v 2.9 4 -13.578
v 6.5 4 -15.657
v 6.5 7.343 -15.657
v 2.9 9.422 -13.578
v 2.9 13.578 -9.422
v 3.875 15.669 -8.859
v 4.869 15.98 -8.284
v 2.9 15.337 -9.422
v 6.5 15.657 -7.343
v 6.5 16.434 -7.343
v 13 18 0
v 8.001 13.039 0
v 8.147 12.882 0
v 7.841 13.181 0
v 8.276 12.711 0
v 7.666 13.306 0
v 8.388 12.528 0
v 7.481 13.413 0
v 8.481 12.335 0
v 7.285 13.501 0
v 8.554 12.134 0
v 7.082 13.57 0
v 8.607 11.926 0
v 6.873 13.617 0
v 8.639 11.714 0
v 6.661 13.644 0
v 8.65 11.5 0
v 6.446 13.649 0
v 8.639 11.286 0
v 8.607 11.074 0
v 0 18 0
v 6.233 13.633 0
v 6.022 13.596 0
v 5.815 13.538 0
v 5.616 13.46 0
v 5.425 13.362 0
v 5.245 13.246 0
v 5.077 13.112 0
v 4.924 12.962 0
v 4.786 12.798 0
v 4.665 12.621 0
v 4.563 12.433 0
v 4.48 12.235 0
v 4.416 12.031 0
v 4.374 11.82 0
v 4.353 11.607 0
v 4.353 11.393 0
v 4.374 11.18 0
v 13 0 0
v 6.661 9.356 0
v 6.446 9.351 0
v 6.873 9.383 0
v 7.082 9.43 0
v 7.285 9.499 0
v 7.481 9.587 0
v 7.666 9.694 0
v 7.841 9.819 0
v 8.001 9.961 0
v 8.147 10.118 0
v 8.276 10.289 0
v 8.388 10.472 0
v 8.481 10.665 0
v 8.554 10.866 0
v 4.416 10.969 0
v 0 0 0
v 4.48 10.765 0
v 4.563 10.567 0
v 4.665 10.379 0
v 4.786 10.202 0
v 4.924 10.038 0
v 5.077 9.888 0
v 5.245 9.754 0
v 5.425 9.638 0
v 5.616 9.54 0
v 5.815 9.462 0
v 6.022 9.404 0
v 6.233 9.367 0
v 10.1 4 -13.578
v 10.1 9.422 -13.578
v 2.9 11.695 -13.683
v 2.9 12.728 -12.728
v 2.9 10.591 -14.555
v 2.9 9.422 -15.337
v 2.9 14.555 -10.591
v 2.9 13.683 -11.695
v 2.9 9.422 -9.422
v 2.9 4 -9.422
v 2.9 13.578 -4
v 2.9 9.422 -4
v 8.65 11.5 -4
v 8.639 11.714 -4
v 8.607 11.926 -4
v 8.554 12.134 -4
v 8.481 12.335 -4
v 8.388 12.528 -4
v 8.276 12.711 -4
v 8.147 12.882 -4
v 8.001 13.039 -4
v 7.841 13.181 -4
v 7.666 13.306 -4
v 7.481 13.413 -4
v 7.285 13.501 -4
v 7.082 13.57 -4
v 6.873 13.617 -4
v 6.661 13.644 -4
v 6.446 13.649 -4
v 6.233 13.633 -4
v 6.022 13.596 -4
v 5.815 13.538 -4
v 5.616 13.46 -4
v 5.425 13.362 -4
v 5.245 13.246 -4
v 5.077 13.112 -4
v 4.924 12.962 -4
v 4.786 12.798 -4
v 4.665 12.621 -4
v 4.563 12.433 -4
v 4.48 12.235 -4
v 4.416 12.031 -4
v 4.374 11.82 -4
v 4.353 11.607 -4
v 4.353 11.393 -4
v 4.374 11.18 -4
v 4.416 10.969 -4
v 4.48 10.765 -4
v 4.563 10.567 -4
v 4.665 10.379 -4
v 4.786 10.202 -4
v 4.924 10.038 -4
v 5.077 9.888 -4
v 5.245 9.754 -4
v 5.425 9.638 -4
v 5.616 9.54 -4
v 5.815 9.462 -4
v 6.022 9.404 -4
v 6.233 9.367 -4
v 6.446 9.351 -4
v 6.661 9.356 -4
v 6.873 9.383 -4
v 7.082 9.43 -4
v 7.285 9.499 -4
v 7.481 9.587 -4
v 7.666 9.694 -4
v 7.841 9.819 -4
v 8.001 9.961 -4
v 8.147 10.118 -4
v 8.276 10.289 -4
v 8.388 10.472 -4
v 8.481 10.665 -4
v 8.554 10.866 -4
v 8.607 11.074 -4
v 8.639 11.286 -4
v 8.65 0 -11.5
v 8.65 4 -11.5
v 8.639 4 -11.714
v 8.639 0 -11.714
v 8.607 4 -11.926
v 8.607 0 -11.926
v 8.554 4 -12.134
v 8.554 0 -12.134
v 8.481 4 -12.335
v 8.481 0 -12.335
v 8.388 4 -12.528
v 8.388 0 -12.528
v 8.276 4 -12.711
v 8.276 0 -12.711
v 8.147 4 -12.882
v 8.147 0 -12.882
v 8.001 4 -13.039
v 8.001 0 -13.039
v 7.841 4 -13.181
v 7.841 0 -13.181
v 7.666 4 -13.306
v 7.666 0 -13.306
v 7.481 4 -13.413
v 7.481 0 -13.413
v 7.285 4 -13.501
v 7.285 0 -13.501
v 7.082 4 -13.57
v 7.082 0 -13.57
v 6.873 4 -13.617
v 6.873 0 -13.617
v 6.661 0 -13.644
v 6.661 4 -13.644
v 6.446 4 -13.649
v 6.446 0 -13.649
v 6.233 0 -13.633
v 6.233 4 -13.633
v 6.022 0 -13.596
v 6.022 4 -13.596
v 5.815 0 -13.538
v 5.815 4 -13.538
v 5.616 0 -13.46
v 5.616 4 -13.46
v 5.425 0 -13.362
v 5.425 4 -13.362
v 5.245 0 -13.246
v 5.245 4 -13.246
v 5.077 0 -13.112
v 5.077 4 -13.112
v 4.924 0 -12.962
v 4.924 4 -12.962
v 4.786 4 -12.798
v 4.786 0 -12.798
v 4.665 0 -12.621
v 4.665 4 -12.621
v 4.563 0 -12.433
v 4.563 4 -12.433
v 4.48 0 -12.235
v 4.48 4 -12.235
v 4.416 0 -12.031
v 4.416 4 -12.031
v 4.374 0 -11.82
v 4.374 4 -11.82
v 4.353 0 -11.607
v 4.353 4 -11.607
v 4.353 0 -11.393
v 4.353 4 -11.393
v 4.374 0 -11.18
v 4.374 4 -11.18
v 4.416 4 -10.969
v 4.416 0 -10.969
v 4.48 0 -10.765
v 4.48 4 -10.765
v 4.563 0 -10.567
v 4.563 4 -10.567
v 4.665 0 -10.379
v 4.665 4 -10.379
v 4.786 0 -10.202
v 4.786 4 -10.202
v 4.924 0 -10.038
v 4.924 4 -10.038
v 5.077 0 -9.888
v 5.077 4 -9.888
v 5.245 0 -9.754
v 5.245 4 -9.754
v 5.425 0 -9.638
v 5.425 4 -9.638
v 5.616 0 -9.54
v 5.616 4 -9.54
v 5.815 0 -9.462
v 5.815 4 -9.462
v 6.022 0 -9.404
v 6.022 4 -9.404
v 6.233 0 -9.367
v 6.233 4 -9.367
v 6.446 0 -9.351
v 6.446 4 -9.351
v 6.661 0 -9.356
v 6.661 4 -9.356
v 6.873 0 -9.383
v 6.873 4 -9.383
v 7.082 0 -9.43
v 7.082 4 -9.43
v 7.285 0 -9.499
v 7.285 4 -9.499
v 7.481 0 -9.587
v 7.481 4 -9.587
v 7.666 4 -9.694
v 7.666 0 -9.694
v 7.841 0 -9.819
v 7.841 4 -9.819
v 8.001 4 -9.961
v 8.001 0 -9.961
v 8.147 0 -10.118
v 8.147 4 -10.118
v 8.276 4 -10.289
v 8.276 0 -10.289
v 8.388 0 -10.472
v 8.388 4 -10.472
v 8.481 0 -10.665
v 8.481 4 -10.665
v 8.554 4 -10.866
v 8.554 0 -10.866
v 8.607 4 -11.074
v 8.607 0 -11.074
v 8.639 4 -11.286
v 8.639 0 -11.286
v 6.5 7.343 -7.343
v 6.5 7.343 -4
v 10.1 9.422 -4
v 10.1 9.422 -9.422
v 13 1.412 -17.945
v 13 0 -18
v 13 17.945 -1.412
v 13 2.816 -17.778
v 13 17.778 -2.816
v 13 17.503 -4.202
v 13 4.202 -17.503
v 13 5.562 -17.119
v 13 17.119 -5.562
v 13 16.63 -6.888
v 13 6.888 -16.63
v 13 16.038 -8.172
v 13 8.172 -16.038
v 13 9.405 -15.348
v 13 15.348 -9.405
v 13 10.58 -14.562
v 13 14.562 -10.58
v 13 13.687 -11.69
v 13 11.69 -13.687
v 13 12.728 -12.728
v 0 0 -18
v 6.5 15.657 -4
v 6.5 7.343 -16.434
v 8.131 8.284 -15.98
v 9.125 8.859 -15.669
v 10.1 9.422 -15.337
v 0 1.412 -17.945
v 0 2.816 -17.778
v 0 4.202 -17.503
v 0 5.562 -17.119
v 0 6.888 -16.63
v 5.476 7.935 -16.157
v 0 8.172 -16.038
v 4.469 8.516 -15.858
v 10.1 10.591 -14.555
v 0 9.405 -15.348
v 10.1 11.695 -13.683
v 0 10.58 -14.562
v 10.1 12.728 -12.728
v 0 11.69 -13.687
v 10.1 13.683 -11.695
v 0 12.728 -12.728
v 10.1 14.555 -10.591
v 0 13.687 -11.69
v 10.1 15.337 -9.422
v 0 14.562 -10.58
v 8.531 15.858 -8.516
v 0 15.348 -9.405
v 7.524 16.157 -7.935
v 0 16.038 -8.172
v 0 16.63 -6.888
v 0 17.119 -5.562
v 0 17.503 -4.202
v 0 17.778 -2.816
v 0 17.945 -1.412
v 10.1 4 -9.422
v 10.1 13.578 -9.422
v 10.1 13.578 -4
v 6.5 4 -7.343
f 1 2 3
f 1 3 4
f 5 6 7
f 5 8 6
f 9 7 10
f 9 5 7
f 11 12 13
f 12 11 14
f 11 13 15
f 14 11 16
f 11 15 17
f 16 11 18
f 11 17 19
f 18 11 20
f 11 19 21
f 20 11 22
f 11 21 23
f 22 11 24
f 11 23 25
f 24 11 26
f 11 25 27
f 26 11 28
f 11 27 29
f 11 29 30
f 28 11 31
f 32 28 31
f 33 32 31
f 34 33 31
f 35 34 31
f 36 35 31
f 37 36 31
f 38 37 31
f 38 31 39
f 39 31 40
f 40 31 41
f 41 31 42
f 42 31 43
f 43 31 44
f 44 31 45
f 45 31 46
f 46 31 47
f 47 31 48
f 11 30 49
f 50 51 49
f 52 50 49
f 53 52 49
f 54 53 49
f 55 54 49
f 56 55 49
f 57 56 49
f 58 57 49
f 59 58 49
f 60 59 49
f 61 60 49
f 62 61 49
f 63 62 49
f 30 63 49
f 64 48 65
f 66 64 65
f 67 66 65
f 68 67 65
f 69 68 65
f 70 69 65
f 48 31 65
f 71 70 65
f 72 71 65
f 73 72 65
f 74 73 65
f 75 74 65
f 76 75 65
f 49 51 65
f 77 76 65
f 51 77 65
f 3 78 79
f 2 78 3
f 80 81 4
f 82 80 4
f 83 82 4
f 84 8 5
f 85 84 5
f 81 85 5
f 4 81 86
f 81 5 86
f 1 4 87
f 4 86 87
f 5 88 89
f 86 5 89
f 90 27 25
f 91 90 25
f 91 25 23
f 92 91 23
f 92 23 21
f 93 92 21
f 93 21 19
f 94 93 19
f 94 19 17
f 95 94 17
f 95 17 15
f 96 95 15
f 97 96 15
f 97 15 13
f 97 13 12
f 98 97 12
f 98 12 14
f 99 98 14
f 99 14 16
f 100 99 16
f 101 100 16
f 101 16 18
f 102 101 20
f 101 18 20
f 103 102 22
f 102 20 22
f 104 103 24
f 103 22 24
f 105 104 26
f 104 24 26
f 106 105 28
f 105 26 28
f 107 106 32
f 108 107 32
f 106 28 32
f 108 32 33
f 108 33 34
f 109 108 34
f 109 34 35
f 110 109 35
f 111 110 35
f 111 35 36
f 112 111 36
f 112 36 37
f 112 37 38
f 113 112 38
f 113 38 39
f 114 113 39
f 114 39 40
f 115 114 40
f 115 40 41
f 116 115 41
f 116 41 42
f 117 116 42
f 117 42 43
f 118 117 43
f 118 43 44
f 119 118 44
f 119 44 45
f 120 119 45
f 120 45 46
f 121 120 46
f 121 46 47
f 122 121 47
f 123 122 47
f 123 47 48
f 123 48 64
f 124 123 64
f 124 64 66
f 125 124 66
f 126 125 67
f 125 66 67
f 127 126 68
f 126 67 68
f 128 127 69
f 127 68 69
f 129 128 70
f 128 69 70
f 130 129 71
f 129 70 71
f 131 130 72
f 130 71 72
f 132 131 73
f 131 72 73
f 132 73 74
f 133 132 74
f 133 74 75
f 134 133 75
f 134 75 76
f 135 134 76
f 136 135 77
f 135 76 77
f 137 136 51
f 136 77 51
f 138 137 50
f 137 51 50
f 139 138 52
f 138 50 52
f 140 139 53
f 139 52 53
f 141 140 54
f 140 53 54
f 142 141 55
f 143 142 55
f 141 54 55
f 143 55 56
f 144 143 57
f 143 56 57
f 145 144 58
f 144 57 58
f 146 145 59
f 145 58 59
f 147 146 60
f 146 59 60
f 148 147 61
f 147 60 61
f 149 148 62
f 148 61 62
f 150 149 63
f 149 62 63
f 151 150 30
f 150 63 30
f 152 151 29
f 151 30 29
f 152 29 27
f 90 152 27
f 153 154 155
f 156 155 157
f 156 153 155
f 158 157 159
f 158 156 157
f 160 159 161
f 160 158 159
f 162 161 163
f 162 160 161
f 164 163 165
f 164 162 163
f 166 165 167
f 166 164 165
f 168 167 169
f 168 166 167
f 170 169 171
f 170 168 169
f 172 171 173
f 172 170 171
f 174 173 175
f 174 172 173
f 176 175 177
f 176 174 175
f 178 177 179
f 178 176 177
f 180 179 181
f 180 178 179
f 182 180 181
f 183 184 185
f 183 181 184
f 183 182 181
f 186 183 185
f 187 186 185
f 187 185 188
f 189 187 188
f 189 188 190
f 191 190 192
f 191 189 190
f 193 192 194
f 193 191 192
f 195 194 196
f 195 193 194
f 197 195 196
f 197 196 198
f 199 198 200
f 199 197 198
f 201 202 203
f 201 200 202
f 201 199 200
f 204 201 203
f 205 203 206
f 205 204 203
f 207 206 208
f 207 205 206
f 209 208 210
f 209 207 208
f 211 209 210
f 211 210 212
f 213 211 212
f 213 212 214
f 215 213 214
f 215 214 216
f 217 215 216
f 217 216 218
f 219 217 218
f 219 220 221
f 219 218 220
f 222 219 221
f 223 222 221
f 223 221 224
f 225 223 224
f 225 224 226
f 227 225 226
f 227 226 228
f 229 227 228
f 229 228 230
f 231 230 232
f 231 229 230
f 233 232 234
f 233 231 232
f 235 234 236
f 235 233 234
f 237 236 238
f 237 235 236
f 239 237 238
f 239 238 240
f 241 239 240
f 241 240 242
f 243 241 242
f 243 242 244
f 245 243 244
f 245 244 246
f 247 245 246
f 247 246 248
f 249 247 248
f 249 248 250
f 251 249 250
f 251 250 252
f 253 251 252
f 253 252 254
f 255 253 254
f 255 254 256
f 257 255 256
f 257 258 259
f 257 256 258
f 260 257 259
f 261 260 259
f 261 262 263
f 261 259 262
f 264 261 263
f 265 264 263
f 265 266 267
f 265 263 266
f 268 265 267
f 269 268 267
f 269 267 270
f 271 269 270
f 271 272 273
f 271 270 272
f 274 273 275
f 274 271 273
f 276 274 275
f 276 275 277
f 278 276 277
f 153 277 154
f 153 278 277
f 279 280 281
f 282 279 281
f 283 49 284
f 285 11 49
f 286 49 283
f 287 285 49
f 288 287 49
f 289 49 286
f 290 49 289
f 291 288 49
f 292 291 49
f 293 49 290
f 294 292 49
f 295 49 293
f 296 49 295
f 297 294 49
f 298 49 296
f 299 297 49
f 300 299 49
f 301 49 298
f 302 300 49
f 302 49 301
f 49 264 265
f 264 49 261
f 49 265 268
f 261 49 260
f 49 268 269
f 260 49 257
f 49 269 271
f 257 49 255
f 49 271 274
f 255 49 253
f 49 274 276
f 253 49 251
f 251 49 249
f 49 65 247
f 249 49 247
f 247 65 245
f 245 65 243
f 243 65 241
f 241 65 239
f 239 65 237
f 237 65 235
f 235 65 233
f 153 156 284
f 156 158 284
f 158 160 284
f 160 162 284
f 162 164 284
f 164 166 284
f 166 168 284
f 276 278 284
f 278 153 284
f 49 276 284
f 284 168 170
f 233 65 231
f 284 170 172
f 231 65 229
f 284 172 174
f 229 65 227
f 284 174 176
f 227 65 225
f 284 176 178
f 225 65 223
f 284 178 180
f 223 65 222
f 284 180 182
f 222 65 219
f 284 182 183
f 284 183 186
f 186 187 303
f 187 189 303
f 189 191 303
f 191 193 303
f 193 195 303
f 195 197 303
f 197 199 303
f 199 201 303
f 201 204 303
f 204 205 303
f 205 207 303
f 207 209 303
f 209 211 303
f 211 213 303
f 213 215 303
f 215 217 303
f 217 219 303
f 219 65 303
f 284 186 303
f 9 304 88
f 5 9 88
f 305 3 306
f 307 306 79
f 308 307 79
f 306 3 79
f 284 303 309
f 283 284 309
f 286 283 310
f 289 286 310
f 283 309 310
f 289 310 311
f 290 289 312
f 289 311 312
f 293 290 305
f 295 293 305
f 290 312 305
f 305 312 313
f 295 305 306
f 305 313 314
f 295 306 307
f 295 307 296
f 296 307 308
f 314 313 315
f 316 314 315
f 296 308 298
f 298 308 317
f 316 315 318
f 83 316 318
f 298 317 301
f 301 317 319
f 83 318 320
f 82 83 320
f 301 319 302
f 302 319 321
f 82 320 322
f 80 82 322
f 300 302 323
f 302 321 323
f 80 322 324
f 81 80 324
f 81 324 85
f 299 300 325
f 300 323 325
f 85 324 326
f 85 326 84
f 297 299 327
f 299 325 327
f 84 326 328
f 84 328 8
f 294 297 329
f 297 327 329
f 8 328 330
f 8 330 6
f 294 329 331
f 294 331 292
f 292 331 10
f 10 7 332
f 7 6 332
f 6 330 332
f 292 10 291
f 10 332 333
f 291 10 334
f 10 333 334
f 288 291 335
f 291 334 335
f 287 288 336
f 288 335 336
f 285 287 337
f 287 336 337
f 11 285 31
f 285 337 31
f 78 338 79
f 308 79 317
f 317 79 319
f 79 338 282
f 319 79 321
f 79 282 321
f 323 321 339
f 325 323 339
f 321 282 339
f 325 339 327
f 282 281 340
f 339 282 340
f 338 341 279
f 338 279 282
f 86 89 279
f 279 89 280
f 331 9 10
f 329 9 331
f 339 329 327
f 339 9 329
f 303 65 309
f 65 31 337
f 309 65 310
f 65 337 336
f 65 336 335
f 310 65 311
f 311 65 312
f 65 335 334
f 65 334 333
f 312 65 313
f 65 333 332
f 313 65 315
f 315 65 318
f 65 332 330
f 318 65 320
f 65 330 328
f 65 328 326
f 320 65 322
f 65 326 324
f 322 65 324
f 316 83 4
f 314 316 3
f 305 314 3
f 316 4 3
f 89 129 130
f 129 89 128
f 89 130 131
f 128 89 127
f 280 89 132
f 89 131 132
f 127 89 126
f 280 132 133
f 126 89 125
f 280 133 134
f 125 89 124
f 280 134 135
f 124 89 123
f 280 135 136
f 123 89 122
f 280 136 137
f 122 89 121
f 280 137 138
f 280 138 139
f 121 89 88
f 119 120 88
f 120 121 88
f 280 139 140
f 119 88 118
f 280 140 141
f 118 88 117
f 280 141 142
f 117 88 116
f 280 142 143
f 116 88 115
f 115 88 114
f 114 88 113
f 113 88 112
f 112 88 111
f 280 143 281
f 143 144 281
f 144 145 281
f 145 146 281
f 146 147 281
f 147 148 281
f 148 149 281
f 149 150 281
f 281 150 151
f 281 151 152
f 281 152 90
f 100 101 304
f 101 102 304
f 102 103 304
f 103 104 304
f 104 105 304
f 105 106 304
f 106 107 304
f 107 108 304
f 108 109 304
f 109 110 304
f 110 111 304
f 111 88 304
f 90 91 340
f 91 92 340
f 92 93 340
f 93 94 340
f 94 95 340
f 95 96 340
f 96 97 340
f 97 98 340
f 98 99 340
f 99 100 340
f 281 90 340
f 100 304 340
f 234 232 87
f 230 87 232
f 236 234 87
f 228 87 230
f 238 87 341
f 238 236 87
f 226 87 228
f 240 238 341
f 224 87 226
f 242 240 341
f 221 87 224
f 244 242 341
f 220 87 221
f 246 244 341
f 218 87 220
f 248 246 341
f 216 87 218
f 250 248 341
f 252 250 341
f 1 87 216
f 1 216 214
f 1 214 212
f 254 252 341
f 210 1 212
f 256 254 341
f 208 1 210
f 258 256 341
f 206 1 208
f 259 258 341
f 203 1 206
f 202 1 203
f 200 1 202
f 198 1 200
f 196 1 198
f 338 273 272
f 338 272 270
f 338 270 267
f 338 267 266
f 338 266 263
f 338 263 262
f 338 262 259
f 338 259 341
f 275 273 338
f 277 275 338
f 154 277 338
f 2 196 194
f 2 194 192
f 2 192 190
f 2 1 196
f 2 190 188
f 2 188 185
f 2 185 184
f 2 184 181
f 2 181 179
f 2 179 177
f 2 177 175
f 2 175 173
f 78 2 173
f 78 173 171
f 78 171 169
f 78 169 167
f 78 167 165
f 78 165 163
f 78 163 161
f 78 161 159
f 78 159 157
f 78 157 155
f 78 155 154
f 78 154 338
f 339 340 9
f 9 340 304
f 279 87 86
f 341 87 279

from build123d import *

# Parameters (mm, degrees)
EXTRUDE1_DEPTH = 13
SKETCH3_R      = 2.15
EXTRUDE2_DEPTH = 30
EXTRUDE3_START = -4
EXTRUDE3_DEPTH = 30


with BuildPart() as part:
    # Sketch2 → Extrude1 (new body)
    with BuildSketch(Plane(origin=(0, 0, 0), x_dir=(0, 0, -1), z_dir=(1, 0, 0))):
        with BuildLine():
            Line((0, 0), (18, 0))
            ThreePointArc((18, 0), (12.727922061, 12.727922061), (0, 18))
            Line((0, 18), (0, 0))
        make_face()
    extrude(amount=EXTRUDE1_DEPTH)

    # Sketch3 → Extrude2 (cut)
    with BuildSketch(Plane.XY):
        with Locations((6.5, 11.5)):
            Circle(SKETCH3_R)
    extrude2 = extrude(amount=-EXTRUDE2_DEPTH, mode=Mode.SUBTRACT)

    # Sketch5 → Extrude3 (cut)
    with BuildSketch(Plane.XY.offset(EXTRUDE3_START)):
        Polygon((6.5, 15.656921938), (2.9, 13.578460969), (2.9, 9.421539031), (6.5, 7.343078062), (10.1, 9.421539031), (10.1, 13.578460969), align=None)
    extrude3 = extrude(amount=-EXTRUDE3_DEPTH, mode=Mode.SUBTRACT)

    # Mirror1: Extrude2, Extrude3 across plane
    add(extrude2.mirror(Plane(origin=(0, 0, 0), x_dir=(0, -0.707106781, 0.707106781), z_dir=(0, 0.707106781, 0.707106781))), mode=Mode.SUBTRACT)
    add(extrude3.mirror(Plane(origin=(0, 0, 0), x_dir=(0, -0.707106781, 0.707106781), z_dir=(0, 0.707106781, 0.707106781))), mode=Mode.SUBTRACT)


solid = part.part
